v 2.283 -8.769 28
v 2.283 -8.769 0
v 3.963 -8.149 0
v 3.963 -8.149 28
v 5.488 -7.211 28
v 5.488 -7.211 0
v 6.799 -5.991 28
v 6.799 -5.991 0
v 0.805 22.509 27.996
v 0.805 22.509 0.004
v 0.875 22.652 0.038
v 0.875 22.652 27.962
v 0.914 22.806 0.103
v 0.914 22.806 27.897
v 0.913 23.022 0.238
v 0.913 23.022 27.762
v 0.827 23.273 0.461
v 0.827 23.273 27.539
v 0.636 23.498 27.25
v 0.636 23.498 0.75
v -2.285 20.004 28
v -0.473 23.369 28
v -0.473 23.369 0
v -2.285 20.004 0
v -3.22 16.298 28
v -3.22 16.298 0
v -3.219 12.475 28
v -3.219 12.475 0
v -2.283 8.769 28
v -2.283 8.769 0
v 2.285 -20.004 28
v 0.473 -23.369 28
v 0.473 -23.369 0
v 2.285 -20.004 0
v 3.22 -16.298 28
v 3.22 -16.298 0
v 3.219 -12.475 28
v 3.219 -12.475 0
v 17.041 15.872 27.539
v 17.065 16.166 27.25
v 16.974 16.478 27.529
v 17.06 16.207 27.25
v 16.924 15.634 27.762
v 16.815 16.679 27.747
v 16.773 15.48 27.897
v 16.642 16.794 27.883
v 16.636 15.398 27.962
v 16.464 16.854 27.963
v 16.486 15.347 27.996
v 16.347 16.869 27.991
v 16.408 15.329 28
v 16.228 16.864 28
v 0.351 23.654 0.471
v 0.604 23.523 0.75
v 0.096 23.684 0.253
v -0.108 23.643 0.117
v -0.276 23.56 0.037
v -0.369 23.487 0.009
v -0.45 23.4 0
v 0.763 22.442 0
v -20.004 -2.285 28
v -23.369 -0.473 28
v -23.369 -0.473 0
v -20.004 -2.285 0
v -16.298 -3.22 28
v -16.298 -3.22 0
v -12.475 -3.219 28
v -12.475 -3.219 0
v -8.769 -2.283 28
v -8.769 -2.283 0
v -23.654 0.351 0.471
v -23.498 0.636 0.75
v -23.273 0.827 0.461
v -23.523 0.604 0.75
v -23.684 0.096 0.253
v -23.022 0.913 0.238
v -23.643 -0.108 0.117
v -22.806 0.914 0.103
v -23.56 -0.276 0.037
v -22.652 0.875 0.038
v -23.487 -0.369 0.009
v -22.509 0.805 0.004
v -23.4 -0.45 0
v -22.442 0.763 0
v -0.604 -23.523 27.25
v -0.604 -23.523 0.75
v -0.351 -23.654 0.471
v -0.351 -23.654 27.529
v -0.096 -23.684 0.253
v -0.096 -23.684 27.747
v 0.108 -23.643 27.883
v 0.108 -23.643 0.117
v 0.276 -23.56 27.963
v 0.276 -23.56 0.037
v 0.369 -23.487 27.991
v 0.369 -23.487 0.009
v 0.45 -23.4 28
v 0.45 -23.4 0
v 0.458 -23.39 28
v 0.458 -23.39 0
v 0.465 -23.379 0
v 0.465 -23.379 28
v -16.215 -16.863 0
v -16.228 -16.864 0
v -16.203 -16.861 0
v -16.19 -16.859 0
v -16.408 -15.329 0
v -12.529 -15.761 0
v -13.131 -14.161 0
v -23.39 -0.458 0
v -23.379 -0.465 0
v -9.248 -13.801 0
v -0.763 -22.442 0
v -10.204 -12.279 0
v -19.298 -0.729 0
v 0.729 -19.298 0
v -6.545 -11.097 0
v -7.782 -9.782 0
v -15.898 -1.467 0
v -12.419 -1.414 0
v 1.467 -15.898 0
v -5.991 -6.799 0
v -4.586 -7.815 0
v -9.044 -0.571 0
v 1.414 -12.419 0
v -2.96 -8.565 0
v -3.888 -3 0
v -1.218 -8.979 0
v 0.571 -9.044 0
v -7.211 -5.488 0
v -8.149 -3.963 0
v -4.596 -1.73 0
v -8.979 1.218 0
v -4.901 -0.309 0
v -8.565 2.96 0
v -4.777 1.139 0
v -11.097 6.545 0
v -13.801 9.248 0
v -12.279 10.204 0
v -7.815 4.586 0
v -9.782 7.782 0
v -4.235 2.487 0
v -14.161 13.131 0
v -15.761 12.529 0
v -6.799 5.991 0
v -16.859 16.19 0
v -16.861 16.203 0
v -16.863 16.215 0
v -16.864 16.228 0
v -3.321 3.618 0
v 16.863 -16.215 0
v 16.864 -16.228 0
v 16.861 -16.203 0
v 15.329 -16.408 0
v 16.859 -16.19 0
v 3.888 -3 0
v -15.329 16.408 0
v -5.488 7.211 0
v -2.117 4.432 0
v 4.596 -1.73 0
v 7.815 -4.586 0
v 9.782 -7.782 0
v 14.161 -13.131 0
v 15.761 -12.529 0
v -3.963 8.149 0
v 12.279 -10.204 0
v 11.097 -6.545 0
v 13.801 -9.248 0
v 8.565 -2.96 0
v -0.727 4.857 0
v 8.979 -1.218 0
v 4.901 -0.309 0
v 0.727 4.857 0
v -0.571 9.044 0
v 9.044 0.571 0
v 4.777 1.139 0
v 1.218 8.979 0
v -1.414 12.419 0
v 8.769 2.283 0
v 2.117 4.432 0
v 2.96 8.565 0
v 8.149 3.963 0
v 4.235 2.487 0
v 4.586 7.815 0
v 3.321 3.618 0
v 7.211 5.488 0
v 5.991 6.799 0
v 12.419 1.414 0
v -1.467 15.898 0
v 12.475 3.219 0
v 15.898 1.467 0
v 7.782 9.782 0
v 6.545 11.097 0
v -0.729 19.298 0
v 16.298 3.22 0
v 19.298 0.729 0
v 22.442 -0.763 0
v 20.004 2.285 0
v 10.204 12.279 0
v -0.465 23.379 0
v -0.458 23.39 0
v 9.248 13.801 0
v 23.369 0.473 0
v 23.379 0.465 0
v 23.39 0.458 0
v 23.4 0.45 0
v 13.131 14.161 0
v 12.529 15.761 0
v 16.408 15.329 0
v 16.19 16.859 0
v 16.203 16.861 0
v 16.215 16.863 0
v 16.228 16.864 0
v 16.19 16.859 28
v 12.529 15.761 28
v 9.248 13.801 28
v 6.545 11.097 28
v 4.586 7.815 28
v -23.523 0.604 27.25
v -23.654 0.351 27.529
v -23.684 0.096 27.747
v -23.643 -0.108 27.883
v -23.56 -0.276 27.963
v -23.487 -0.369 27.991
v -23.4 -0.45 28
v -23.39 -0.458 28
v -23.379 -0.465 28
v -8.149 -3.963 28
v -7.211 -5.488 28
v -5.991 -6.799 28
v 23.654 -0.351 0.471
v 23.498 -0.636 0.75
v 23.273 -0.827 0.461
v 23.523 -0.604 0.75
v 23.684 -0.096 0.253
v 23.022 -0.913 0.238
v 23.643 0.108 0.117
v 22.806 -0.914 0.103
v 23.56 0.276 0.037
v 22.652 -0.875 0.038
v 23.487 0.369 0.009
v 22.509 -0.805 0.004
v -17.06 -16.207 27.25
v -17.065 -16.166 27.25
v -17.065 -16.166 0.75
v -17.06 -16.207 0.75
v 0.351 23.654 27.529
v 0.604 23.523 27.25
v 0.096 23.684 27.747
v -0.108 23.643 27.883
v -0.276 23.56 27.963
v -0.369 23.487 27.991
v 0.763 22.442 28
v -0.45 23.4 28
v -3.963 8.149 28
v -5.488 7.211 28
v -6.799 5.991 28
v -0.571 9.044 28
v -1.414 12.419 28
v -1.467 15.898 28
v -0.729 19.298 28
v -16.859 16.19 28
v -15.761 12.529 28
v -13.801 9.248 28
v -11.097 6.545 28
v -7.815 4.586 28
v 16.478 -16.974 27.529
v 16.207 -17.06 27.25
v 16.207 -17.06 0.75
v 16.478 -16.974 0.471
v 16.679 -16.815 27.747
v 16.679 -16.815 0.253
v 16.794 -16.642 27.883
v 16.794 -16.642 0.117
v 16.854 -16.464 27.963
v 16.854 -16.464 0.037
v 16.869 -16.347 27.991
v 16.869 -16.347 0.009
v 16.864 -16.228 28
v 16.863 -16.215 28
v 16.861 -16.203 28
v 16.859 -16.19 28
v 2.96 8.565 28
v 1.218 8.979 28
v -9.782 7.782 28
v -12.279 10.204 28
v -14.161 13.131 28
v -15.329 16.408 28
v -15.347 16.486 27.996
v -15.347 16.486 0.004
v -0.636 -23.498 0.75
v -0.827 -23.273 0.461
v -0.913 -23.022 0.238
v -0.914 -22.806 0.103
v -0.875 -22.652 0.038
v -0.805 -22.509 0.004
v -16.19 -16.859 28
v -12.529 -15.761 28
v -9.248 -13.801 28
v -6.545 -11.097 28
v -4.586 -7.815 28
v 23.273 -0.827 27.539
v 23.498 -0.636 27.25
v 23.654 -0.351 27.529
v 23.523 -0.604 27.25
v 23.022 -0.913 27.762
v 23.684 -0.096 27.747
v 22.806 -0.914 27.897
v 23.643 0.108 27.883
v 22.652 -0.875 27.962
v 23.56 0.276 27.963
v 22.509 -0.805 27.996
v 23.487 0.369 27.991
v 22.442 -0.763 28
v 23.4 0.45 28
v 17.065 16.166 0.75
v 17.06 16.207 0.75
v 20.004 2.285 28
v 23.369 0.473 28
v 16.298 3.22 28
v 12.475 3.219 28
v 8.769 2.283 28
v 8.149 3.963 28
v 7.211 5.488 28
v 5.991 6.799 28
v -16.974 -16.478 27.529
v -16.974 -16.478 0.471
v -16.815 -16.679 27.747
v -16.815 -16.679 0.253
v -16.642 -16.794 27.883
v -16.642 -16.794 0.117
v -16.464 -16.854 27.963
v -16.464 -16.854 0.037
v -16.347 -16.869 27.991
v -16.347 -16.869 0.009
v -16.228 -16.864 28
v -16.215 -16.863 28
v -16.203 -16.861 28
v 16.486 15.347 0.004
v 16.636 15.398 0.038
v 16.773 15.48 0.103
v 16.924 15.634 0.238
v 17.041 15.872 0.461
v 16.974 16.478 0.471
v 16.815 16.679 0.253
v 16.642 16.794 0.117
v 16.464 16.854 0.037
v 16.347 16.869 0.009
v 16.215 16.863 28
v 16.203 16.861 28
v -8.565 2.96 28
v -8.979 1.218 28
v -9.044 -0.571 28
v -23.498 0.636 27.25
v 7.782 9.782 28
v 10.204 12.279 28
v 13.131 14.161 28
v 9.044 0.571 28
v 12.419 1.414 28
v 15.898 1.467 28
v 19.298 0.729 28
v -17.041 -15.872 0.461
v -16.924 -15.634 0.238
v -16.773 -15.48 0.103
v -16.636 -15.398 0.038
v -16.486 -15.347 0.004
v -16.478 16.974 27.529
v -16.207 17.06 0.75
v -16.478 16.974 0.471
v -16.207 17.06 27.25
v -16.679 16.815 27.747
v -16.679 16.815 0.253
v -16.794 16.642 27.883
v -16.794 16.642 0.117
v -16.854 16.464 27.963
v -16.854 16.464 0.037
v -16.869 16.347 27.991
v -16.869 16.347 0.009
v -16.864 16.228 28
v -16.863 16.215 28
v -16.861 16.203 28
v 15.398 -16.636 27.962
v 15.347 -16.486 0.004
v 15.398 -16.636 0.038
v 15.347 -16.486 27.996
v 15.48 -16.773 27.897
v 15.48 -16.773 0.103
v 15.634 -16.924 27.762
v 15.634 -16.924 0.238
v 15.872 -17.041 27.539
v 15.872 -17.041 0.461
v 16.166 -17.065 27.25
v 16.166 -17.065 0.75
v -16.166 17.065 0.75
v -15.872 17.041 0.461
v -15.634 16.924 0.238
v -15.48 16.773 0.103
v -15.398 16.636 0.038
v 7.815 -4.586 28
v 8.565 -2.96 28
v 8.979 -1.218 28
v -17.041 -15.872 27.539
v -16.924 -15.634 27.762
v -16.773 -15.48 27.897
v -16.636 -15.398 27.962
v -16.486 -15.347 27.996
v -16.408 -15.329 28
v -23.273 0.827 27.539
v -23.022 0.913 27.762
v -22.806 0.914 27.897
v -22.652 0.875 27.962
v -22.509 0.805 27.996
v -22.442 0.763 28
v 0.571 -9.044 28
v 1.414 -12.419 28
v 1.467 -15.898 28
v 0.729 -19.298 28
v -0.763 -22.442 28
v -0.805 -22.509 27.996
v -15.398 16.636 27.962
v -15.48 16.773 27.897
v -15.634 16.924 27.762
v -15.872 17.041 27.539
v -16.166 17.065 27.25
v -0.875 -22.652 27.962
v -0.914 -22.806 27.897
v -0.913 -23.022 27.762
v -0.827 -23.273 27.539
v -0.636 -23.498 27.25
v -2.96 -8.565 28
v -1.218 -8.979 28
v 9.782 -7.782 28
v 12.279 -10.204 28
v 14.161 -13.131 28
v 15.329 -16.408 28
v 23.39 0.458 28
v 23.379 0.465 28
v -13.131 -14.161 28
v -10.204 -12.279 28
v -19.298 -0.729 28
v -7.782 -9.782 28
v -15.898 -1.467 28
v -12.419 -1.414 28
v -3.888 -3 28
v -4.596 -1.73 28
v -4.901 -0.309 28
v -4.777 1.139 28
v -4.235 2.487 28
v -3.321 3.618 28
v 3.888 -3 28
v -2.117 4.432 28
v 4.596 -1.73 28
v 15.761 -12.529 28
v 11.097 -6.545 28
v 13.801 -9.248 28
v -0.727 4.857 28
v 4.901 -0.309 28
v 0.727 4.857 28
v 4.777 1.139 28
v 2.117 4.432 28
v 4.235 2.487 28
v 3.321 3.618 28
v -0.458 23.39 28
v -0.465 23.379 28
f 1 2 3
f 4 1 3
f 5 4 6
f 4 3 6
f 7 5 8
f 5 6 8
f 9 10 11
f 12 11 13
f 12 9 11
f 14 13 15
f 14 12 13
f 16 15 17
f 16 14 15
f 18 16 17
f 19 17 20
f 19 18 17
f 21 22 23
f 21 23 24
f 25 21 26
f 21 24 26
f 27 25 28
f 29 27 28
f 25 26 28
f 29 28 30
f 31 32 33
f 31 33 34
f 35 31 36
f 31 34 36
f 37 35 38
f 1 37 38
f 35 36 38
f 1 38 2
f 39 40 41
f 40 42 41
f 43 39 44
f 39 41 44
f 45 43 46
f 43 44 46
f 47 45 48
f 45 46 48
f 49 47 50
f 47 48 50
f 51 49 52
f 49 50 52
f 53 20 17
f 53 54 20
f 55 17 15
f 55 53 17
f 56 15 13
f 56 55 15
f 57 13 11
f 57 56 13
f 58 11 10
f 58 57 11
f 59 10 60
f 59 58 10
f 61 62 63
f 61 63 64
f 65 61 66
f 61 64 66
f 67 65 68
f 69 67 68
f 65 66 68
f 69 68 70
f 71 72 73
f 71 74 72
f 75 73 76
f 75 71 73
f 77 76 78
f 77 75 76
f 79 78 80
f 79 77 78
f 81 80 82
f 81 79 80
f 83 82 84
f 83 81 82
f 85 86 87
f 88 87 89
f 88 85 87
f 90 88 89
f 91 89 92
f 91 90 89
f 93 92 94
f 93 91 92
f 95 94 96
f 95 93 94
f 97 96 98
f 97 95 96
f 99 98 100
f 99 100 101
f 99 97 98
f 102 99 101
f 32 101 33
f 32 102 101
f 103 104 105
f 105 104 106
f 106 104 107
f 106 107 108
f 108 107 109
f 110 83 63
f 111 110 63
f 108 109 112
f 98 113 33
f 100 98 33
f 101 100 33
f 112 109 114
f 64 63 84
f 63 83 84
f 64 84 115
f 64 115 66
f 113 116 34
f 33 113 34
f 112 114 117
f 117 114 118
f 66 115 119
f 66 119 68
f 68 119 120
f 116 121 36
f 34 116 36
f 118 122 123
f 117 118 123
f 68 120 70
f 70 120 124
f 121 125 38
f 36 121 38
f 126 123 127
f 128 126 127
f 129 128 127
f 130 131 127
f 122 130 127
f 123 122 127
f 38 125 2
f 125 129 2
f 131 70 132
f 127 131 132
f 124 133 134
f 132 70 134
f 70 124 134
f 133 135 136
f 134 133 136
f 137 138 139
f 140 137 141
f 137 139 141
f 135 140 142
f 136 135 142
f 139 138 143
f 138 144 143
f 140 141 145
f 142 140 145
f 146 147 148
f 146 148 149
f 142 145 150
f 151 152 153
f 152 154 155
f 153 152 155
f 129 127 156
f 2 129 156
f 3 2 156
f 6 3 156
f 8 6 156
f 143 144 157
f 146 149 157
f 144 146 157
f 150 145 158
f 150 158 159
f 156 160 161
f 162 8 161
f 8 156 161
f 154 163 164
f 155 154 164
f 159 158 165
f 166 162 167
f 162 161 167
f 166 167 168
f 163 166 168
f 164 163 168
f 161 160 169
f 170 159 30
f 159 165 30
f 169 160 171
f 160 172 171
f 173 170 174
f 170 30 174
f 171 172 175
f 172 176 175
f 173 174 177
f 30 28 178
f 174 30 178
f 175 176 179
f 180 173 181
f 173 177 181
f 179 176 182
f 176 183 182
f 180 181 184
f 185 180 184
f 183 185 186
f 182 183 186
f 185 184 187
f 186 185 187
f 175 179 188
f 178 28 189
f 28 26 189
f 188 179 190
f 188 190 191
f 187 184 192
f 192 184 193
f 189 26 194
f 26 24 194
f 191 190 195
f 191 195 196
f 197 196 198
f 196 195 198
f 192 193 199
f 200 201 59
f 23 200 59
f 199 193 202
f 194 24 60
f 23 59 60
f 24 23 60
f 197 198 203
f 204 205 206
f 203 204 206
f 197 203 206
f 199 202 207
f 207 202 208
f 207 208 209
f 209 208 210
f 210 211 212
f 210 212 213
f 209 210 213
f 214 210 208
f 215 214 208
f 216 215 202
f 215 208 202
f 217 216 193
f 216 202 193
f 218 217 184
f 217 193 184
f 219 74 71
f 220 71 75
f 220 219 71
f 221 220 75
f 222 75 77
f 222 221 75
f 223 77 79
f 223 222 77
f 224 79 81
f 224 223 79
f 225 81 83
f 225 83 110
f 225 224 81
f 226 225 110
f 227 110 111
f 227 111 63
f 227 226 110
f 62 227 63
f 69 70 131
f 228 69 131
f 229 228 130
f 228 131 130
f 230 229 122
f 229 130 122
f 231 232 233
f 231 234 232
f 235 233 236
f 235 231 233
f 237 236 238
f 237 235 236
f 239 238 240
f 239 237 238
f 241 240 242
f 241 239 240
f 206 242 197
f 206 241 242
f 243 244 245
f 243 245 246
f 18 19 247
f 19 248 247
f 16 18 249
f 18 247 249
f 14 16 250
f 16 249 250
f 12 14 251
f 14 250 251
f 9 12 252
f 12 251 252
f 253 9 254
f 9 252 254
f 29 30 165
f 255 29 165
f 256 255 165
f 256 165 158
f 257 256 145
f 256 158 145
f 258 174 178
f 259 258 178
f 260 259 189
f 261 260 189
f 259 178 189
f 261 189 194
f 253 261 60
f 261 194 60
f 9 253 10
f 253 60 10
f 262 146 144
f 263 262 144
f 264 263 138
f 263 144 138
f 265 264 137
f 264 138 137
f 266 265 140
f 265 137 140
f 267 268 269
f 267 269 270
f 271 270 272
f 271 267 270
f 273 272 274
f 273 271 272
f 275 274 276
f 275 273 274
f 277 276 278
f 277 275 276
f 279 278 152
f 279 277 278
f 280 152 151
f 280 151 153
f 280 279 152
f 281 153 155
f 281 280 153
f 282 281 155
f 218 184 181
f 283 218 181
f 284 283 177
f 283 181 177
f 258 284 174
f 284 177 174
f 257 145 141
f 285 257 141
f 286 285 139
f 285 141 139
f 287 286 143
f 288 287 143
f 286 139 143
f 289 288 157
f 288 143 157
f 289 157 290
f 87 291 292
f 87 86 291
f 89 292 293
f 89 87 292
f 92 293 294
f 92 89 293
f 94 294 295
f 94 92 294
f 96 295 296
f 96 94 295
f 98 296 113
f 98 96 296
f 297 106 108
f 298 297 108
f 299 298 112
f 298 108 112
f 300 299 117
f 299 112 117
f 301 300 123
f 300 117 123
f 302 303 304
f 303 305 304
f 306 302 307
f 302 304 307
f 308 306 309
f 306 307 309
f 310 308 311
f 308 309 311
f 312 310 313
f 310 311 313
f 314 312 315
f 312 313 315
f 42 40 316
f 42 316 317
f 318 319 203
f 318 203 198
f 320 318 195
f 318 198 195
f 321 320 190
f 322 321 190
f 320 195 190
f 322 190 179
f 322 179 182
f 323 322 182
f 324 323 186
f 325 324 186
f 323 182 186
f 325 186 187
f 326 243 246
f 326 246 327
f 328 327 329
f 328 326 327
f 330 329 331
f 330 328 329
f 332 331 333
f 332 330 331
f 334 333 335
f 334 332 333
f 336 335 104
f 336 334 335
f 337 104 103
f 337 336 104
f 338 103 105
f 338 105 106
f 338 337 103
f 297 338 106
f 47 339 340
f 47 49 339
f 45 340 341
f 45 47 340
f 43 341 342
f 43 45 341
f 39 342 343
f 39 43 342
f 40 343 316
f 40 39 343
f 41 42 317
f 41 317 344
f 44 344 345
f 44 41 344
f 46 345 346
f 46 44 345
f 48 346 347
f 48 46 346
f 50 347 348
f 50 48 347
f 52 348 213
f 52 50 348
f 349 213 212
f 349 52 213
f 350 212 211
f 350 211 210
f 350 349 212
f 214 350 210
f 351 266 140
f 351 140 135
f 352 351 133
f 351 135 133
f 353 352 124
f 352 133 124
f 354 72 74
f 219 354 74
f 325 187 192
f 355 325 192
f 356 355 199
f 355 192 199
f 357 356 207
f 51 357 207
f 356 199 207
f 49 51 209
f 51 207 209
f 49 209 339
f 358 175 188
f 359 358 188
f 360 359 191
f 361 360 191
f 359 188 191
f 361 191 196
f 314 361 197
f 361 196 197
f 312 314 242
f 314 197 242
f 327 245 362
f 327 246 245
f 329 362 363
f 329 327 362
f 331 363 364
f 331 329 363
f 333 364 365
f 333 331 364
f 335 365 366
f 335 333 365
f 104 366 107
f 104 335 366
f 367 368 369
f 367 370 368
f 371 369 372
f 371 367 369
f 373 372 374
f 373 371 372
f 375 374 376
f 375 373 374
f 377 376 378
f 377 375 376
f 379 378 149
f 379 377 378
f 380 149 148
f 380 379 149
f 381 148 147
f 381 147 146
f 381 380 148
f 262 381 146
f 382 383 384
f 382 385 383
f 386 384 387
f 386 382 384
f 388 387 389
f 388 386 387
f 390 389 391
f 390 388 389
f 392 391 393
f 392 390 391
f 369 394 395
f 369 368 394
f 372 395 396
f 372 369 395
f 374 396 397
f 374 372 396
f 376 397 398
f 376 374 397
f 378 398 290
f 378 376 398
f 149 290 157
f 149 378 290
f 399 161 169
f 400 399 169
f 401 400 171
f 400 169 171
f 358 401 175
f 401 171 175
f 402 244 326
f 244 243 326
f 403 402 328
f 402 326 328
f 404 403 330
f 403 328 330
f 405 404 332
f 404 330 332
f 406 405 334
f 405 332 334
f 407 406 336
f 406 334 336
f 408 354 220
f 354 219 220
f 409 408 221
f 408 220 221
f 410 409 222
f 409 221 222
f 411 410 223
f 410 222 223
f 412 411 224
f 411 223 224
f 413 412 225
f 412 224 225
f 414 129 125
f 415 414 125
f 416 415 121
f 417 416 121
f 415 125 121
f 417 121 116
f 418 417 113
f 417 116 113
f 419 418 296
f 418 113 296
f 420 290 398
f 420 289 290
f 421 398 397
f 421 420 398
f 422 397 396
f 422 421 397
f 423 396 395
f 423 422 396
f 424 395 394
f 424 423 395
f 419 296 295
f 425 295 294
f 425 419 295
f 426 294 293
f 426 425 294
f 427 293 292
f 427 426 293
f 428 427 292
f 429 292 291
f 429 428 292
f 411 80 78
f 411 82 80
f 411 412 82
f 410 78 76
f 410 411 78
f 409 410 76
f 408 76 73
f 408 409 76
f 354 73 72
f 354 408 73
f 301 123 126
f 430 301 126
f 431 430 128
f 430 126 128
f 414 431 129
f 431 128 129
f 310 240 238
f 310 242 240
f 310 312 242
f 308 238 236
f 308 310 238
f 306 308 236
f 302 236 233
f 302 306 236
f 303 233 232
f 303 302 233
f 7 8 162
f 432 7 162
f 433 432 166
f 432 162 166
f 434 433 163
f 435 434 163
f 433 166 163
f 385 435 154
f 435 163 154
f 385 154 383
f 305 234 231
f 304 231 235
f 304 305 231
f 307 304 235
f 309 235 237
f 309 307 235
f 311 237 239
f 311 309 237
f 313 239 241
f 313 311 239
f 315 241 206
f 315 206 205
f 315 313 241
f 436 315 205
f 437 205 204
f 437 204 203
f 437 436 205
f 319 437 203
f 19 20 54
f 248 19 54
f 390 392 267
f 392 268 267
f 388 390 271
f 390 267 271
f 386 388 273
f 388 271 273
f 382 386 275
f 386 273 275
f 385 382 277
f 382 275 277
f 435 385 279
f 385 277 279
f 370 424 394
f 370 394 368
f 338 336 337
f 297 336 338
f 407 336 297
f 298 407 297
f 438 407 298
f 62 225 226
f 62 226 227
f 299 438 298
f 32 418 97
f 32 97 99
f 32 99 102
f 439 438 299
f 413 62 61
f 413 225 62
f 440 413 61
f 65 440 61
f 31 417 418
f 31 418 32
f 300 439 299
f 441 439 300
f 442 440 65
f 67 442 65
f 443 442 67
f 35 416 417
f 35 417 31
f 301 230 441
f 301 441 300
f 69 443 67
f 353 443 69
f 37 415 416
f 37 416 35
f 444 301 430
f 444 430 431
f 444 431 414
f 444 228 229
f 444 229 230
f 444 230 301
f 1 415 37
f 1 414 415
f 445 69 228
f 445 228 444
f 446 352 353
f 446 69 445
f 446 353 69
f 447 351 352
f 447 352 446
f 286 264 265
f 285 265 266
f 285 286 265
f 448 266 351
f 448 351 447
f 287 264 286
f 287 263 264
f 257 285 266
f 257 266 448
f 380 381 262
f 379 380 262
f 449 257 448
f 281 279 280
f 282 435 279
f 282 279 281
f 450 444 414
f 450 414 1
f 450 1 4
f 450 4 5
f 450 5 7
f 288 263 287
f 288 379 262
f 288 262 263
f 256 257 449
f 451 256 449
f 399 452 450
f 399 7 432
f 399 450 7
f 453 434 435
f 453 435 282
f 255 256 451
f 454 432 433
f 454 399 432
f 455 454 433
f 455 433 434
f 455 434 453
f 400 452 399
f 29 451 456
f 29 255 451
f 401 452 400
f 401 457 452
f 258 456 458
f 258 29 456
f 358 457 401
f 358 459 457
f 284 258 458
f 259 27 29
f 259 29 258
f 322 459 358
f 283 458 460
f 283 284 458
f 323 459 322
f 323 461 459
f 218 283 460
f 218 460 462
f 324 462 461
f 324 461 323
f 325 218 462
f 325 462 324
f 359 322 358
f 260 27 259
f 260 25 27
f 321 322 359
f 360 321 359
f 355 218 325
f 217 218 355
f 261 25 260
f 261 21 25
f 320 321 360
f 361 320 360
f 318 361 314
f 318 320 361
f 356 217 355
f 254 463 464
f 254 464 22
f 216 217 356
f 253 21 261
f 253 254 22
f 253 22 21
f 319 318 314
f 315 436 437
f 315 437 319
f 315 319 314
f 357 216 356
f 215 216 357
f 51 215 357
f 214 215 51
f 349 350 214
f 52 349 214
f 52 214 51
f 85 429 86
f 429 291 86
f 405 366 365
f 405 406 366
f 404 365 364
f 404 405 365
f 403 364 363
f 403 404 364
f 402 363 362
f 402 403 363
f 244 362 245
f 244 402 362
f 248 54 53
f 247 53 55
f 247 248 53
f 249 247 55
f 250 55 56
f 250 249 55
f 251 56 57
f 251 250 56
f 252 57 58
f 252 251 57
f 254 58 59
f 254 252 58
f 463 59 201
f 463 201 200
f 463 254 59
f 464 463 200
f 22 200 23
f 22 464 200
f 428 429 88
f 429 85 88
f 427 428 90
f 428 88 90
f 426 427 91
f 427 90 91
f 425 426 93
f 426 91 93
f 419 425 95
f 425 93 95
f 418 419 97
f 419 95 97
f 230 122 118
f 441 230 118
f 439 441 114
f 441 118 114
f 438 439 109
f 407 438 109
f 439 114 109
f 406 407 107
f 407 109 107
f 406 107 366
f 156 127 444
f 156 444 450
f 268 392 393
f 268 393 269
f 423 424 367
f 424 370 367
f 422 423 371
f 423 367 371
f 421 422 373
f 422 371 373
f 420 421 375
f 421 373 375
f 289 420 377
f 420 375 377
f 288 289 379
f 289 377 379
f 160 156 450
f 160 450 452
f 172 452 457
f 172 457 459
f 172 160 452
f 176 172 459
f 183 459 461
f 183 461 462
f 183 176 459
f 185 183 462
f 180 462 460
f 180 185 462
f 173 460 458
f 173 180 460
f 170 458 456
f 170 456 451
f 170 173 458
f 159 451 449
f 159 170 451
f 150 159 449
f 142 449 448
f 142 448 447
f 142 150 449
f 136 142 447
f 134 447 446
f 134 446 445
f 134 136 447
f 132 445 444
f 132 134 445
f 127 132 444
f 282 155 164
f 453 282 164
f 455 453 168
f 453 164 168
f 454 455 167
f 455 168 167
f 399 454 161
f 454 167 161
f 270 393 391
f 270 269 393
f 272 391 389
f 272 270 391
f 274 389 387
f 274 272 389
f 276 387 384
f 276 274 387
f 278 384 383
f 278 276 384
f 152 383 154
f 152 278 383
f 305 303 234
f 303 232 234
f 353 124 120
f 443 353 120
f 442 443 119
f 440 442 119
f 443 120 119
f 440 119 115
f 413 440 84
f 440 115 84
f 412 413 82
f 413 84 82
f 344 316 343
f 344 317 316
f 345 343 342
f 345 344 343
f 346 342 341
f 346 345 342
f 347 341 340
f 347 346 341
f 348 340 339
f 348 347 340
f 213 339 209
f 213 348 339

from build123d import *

# Parameters (mm, degrees)
SKETCH1_R           = 9.061638146
BOSS_EXTRUDE1_DEPTH = 28
FILLET1_R           = 0.75


with BuildPart() as part:
    # Sketch1 → Boss-Extrude1 (new body)
    with BuildSketch(Plane.XY):
        Circle(SKETCH1_R)
        with BuildLine():
            ThreePointArc((3.888321502, -3), (0, 4.911114344), (-3.888321502, -3))
            Line((-3.888321502, -3), (3.888321502, -3))
        make_face(mode=Mode.SUBTRACT)
        with BuildLine():
            ThreePointArc((-4.58615413, -7.815399938), (-5.312879632, -7.340749002), (-5.990857259, -6.798743648))
            ThreePointArc((-5.990857259, -6.798743648), (-10.498546947, -12.514092303), (-17.145581833, -15.480808299))
            Line((-17.145581833, -15.480808299), (-16.970562748, -16.970562748))
            ThreePointArc((-16.970562748, -16.970562748), (-9.561507432, -14.039044926), (-4.58615413, -7.815399938))
        make_face()
        with BuildLine():
            ThreePointArc((-8.769222979, -2.283421609), (-8.947466614, -1.433920183), (-9.04361353, -0.571261944))
            ThreePointArc((-9.04361353, -0.571261944), (-16.272393267, -1.425205789), (-23.070341708, 1.177172655))
            Line((-23.070341708, 1.177172655), (-24, 0))
            ThreePointArc((-24, 0), (-16.688110612, -3.166097125), (-8.769222979, -2.283421609))
        make_face()
        with BuildLine():
            ThreePointArc((-7.815399938, 4.58615413), (-7.340749002, 5.312879632), (-6.798743648, 5.990857259))
            ThreePointArc((-6.798743648, 5.990857259), (-12.514092303, 10.498546947), (-15.480808299, 17.145581833))
            Line((-15.480808299, 17.145581833), (-16.970562748, 16.970562748))
            ThreePointArc((-16.970562748, 16.970562748), (-14.039044926, 9.561507432), (-7.815399938, 4.58615413))
        make_face()
        with BuildLine():
            Line((1.177172655, 23.070341708), (0, 24))
            ThreePointArc((0, 24), (-3.166097125, 16.688110612), (-2.283421609, 8.769222979))
            ThreePointArc((-2.283421609, 8.769222979), (-1.433920183, 8.947466614), (-0.571261944, 9.04361353))
            ThreePointArc((-0.571261944, 9.04361353), (-1.425205789, 16.272393267), (1.177172655, 23.070341708))
        make_face()
        with BuildLine():
            ThreePointArc((16.970562748, 16.970562748), (9.561507432, 14.039044926), (4.58615413, 7.815399938))
            ThreePointArc((4.58615413, 7.815399938), (5.312879632, 7.340749002), (5.990857259, 6.798743648))
            ThreePointArc((5.990857259, 6.798743648), (10.498546947, 12.514092303), (17.145581833, 15.480808299))
            Line((17.145581833, 15.480808299), (16.970562748, 16.970562748))
        make_face()
        with BuildLine():
            ThreePointArc((24, 0), (16.688110612, 3.166097125), (8.769222979, 2.283421609))
            ThreePointArc((8.769222979, 2.283421609), (8.947466614, 1.433920183), (9.04361353, 0.571261944))
            ThreePointArc((9.04361353, 0.571261944), (16.272393267, 1.425205789), (23.070341708, -1.177172655))
            Line((23.070341708, -1.177172655), (24, 0))
        make_face()
        with BuildLine():
            ThreePointArc((16.970562748, -16.970562748), (14.039044926, -9.561507432), (7.815399938, -4.58615413))
            ThreePointArc((7.815399938, -4.58615413), (7.340749002, -5.312879632), (6.798743648, -5.990857259))
            ThreePointArc((6.798743648, -5.990857259), (12.514092303, -10.498546947), (15.480808299, -17.145581833))
            Line((15.480808299, -17.145581833), (16.970562748, -16.970562748))
        make_face()
        with BuildLine():
            ThreePointArc((2.283421609, -8.769222979), (1.433920183, -8.947466614), (0.571261944, -9.04361353))
            ThreePointArc((0.571261944, -9.04361353), (1.425205789, -16.272393267), (-1.177172655, -23.070341708))
            Line((-1.177172655, -23.070341708), (0, -24))
            ThreePointArc((0, -24), (3.166097125, -16.688110612), (2.283421609, -8.769222979))
        make_face()
    extrude(amount=BOSS_EXTRUDE1_DEPTH)

    # Fillet1
    fillet1_edges = [part.edges().sort_by_distance(p)[0] for p in [
        (-17.058072291, -16.225685524, 28),
        (-0.588586328, -23.535170854, 28),
        (16.225685524, -17.058072291, 28),
        (23.535170854, -0.588586328, 28),
        (16.225685524, -17.058072291, 0),
        (-0.588586328, -23.535170854, 0),
        (-17.058072291, -16.225685524, 0),
        (-23.535170854, 0.588586328, 0),
        (-16.225685524, 17.058072291, 0),
        (17.058072291, 16.225685524, 28),
        (0.588586328, 23.535170854, 0),
        (17.058072291, 16.225685524, 0),
        (23.535170854, -0.588586328, 0),
        (16.970562748, -16.970562748, 14),
        (15.480808299, -17.145581833, 14),
        (0, -24, 14),
        (-1.177172655, -23.070341708, 14),
        (0.588586328, 23.535170854, 28),
        (-16.970562748, -16.970562748, 14),
        (-17.145581833, -15.480808299, 14),
        (-24, 0, 14),
        (-23.070341708, 1.177172655, 14),
        (-16.970562748, 16.970562748, 14),
        (-15.480808299, 17.145581833, 14),
        (0, 24, 14),
        (1.177172655, 23.070341708, 14),
        (16.970562748, 16.970562748, 14),
        (17.145581833, 15.480808299, 14),
        (24, 0, 14),
        (23.070341708, -1.177172655, 14),
        (-16.225685524, 17.058072291, 28),
        (-23.535170854, 0.588586328, 28),
    ]]
    fillet(fillet1_edges, radius=FILLET1_R)


solid = part.part
